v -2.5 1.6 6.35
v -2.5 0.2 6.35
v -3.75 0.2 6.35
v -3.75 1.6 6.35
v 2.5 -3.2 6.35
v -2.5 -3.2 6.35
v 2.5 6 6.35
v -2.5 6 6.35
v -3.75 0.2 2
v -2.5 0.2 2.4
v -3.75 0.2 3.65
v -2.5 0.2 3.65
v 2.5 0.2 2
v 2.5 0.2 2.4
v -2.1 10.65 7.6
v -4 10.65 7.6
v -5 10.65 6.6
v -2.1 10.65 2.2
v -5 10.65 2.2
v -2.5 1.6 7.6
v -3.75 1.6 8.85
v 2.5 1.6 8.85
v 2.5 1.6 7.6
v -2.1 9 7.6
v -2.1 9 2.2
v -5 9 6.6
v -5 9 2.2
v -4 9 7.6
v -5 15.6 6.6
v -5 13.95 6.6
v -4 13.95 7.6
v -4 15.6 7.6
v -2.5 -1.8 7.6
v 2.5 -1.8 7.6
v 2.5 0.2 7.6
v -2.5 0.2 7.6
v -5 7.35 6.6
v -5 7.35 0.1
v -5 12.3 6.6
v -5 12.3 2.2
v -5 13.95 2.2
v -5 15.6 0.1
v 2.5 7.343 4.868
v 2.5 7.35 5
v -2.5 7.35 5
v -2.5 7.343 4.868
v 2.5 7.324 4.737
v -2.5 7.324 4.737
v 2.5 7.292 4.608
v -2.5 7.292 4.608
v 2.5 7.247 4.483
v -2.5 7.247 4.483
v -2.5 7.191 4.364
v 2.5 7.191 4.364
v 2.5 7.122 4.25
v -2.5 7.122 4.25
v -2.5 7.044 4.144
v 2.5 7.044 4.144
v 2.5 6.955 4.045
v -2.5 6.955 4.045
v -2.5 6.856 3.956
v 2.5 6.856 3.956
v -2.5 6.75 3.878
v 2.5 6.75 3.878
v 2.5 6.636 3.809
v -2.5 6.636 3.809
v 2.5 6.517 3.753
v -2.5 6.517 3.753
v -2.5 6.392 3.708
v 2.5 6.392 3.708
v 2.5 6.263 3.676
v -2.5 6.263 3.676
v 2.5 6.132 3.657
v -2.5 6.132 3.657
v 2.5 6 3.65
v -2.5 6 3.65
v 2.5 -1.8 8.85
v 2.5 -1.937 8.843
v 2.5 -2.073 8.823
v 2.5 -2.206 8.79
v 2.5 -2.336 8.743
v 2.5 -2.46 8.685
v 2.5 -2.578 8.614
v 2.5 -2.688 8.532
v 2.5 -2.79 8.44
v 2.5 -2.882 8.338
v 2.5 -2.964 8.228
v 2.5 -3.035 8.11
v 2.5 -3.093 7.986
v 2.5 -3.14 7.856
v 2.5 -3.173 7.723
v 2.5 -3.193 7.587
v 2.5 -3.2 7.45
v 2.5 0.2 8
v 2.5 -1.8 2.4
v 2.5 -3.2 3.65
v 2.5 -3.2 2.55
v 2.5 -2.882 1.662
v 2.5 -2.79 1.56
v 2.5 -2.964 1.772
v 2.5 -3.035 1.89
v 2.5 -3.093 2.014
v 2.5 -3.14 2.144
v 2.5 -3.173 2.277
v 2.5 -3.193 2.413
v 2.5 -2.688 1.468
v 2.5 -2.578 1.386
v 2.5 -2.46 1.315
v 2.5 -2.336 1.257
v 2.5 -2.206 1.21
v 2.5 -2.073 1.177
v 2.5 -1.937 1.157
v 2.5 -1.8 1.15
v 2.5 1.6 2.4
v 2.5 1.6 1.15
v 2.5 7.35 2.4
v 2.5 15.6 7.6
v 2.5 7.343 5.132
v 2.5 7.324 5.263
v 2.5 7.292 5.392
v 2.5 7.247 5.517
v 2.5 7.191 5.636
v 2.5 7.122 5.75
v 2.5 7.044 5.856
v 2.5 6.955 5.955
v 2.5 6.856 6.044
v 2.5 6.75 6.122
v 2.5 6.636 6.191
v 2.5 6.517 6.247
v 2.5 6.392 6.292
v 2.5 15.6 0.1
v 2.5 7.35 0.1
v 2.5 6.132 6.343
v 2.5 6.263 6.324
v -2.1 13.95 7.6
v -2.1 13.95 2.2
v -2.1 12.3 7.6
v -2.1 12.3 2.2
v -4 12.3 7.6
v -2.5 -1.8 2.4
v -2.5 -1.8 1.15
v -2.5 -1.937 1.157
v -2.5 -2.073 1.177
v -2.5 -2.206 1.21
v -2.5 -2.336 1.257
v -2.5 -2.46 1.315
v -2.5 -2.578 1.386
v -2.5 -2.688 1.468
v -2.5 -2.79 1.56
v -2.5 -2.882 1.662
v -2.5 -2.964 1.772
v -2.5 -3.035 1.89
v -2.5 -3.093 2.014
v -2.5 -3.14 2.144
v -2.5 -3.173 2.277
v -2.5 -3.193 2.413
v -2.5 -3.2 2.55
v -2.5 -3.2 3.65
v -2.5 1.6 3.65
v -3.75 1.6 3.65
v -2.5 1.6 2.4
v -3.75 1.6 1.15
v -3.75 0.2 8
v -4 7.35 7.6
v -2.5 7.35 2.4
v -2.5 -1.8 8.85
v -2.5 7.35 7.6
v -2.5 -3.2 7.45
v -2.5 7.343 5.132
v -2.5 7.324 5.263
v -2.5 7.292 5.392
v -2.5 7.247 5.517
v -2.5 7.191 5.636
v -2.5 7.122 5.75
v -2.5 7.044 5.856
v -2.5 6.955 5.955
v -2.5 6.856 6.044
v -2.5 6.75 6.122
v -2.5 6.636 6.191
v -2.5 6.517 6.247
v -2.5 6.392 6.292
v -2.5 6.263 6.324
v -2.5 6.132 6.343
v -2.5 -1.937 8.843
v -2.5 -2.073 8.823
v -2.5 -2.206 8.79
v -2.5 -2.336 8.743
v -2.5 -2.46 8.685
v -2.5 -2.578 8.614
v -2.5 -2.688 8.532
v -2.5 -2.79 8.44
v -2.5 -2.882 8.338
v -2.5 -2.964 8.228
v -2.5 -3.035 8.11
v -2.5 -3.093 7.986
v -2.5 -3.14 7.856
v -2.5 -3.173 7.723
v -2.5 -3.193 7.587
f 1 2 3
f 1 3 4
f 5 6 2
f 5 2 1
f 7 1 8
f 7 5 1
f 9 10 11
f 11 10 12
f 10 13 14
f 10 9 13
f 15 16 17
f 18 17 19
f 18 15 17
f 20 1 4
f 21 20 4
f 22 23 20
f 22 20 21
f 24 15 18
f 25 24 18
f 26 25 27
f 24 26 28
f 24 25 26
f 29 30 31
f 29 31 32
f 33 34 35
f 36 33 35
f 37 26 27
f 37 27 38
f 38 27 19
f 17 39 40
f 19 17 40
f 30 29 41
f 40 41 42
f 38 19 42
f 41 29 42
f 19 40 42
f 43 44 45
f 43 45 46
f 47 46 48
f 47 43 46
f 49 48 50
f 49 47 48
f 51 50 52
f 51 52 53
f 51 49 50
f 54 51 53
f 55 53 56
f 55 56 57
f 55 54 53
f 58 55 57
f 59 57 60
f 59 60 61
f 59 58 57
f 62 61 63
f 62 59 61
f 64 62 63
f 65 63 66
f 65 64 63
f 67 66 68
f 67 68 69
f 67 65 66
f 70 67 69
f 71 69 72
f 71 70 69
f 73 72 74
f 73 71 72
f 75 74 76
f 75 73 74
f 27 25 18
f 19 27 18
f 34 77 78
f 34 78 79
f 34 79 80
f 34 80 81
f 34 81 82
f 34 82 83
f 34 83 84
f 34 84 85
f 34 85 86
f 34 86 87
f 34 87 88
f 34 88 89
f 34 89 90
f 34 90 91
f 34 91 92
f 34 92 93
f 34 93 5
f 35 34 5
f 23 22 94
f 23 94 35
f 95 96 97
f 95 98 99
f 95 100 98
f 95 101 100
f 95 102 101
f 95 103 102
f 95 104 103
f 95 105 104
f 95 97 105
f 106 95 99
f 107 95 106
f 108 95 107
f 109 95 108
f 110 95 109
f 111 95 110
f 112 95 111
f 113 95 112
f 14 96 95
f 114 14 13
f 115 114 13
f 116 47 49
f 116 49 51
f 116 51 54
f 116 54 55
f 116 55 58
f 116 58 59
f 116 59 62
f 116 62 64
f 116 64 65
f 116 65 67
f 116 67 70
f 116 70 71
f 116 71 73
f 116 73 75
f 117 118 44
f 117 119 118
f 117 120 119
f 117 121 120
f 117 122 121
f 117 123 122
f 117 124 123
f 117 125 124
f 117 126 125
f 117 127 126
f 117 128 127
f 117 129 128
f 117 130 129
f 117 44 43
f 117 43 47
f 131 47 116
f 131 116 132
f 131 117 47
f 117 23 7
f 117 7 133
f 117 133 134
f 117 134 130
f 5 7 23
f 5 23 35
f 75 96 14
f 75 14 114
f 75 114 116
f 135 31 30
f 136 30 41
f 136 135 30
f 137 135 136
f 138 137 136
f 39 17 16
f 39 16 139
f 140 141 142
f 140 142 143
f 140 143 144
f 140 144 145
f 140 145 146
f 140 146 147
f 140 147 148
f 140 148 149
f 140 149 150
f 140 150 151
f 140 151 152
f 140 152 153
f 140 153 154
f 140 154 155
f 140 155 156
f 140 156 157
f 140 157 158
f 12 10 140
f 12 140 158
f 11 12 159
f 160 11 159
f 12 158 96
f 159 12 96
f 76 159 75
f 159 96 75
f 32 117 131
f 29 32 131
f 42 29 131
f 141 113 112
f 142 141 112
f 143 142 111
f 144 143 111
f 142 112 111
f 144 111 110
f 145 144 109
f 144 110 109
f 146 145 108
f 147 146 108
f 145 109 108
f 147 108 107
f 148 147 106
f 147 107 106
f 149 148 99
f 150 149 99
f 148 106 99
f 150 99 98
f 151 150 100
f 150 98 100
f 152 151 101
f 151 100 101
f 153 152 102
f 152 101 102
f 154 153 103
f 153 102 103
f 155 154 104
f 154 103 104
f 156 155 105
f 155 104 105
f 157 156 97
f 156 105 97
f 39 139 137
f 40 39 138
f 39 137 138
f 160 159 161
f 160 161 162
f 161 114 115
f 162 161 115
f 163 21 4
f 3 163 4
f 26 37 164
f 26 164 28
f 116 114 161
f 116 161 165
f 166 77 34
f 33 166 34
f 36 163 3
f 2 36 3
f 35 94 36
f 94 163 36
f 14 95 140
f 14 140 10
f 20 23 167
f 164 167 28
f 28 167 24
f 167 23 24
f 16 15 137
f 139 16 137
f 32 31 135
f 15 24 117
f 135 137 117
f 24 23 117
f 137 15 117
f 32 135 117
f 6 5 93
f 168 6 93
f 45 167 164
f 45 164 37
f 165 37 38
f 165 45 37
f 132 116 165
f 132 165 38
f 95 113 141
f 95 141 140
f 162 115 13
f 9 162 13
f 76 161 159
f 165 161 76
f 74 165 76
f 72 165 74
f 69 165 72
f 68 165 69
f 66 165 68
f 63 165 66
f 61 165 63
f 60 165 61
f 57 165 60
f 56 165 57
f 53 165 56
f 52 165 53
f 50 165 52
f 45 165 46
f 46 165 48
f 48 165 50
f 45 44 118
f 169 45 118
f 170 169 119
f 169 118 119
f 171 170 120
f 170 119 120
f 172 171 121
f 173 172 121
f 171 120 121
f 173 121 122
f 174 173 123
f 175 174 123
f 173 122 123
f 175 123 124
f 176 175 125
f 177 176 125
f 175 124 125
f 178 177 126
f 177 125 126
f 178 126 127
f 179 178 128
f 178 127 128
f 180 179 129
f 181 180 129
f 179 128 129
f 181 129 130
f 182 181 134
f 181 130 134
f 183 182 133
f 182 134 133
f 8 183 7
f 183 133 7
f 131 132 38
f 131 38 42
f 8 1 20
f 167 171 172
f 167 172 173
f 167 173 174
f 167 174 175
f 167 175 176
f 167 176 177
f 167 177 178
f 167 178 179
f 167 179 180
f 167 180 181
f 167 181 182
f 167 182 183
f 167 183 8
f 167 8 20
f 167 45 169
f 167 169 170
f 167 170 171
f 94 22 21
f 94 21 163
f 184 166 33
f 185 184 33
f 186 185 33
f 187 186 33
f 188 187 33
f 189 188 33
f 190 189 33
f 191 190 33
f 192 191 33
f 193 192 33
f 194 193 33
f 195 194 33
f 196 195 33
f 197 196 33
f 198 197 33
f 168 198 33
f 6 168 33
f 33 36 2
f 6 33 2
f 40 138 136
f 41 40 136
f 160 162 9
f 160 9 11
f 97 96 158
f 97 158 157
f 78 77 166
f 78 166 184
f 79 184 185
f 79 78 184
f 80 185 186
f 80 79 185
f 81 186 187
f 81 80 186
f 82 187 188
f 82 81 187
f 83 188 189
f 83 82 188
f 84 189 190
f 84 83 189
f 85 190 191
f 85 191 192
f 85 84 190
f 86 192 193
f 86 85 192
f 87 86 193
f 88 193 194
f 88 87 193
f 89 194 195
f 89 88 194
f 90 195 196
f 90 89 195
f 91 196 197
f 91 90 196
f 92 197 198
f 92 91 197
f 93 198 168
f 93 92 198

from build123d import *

# Parameters (mm, degrees)
PAD017_DEPTH              = 5
PAD020_DEPTH              = 6.25
SKETCH109_W               = 7.5
SKETCH109_H               = 1.65
PAD078_DEPTH              = 7.5
SKETCH107_W               = 2.1
SKETCH107_H               = 1.65
PAD079_DEPTH              = 7.5
SKETCH106_W               = 7.5
SKETCH106_H               = 1.65
PAD080_DEPTH              = 4.6
SKETCH108_W               = 7.5
SKETCH108_H               = 1.65
PAD081_DEPTH              = 7.5
LINEARPATTERN025_COUNT    = 2
LINEARPATTERN025_PITCH    = 3.3
CHAMFER015_SIZE           = 1
MIRROR013_PLACEMENT_ANGLE = 90


with BuildPart() as bc_c:
    # Sketch034 → Pad017 (new body)
    with BuildSketch(Plane.XY):
        with BuildLine():
            Line((-1.35, -1.8), (-1.35, 6))
            ThreePointArc((0, 7.35), (-0.954594, 6.954594), (-1.35, 6))
            Line((0, 9), (0, 7.35))
            Line((-2.6, 9), (0, 9))
            Line((-2.6, -1.8), (-2.6, 9))
            Line((-3.85, -1.8), (-2.6, -1.8))
            ThreePointArc((-3.85, -1.8), (-3.439949, -2.789949), (-2.45, -3.2))
            Line((-1.35, -3.2), (-2.45, -3.2))
            Line((-1.35, -1.8), (-1.35, -3.2))
        make_face()
    extrude(amount=PAD017_DEPTH)

    # Sketch037 → Pad020 (join)
    with BuildSketch(Plane.XY):
        Polygon((-1.35, 0.2), (-1.35, 1.6), (-2.6, 1.6), (-3.85, 1.6), (-3, 0.2), (-2.6, 0.2), align=None)
    extrude(amount=PAD020_DEPTH)


with BuildPart() as bc_s_mirrored:
    # Mirror001: instance of _bc_c
    add(bc_c.part.mirror(Plane(origin=(0, 0, 0), x_dir=(0, 1, 0), z_dir=(-1, 0, 0))))


with BuildPart() as body040:
    # Fusion001 base: copy of _bc_c
    add(bc_c.part)

    # Fusion001: union _bc_s(mirrored)
    add(bc_s_mirrored.part)

    # Sketch109 → Pad078 (new body)
    with BuildSketch(Plane.XY):
        with Locations((1.15, 8.175)):
            Rectangle(SKETCH109_W, SKETCH109_H)
    extrude(amount=PAD078_DEPTH)

    # Sketch107 → Pad079 (join)
    with BuildSketch(Plane.XY):
        with Locations((3.85, 9.825)):
            Rectangle(SKETCH107_W, SKETCH107_H)
    pad079 = extrude(amount=PAD079_DEPTH)

    # Sketch106 → Pad080 (join)
    with BuildSketch(Plane.XY):
        with Locations((1.15, 9.825)):
            Rectangle(SKETCH106_W, SKETCH106_H)
    pad080 = extrude(amount=PAD080_DEPTH)

    # Sketch108 → Pad081 (join)
    with BuildSketch(Plane.XY):
        with Locations((1.15, 11.475)):
            Rectangle(SKETCH108_W, SKETCH108_H)
    pad081 = extrude(amount=PAD081_DEPTH)

    # LinearPattern025: Pad081, Pad080, Pad079 ×2
    with Locations(*[(0, i * LINEARPATTERN025_PITCH, 0) for i in range(1, LINEARPATTERN025_COUNT)]):
        add(pad081)
        add(pad080)
        add(pad079)

    # Chamfer015
    chamfer015_edges = [body040.edges().sort_by_distance(p)[0] for p in [
        (-2.6, 14.775, 7.5),
        (-2.6, 11.475, 7.5),
        (-2.6, 8.175, 7.5),
    ]]
    chamfer(chamfer015_edges, length=CHAMFER015_SIZE)


with BuildPart() as mirror013:
    # Mirror013: instance of Body040
    add(body040.part.mirror(Plane(origin=(0, 0, 0), x_dir=(0, -1, 0), z_dir=(1, 0, 0))))


with BuildPart() as mirror013_1:
    # Mirror013 placement: moved
    add(mirror013.part.moved(Location((2.5, 0, 5))).rotate(Axis((2.5, 0, 5), (0, -1, 0)), MIRROR013_PLACEMENT_ANGLE))


solid = mirror013_1.part
